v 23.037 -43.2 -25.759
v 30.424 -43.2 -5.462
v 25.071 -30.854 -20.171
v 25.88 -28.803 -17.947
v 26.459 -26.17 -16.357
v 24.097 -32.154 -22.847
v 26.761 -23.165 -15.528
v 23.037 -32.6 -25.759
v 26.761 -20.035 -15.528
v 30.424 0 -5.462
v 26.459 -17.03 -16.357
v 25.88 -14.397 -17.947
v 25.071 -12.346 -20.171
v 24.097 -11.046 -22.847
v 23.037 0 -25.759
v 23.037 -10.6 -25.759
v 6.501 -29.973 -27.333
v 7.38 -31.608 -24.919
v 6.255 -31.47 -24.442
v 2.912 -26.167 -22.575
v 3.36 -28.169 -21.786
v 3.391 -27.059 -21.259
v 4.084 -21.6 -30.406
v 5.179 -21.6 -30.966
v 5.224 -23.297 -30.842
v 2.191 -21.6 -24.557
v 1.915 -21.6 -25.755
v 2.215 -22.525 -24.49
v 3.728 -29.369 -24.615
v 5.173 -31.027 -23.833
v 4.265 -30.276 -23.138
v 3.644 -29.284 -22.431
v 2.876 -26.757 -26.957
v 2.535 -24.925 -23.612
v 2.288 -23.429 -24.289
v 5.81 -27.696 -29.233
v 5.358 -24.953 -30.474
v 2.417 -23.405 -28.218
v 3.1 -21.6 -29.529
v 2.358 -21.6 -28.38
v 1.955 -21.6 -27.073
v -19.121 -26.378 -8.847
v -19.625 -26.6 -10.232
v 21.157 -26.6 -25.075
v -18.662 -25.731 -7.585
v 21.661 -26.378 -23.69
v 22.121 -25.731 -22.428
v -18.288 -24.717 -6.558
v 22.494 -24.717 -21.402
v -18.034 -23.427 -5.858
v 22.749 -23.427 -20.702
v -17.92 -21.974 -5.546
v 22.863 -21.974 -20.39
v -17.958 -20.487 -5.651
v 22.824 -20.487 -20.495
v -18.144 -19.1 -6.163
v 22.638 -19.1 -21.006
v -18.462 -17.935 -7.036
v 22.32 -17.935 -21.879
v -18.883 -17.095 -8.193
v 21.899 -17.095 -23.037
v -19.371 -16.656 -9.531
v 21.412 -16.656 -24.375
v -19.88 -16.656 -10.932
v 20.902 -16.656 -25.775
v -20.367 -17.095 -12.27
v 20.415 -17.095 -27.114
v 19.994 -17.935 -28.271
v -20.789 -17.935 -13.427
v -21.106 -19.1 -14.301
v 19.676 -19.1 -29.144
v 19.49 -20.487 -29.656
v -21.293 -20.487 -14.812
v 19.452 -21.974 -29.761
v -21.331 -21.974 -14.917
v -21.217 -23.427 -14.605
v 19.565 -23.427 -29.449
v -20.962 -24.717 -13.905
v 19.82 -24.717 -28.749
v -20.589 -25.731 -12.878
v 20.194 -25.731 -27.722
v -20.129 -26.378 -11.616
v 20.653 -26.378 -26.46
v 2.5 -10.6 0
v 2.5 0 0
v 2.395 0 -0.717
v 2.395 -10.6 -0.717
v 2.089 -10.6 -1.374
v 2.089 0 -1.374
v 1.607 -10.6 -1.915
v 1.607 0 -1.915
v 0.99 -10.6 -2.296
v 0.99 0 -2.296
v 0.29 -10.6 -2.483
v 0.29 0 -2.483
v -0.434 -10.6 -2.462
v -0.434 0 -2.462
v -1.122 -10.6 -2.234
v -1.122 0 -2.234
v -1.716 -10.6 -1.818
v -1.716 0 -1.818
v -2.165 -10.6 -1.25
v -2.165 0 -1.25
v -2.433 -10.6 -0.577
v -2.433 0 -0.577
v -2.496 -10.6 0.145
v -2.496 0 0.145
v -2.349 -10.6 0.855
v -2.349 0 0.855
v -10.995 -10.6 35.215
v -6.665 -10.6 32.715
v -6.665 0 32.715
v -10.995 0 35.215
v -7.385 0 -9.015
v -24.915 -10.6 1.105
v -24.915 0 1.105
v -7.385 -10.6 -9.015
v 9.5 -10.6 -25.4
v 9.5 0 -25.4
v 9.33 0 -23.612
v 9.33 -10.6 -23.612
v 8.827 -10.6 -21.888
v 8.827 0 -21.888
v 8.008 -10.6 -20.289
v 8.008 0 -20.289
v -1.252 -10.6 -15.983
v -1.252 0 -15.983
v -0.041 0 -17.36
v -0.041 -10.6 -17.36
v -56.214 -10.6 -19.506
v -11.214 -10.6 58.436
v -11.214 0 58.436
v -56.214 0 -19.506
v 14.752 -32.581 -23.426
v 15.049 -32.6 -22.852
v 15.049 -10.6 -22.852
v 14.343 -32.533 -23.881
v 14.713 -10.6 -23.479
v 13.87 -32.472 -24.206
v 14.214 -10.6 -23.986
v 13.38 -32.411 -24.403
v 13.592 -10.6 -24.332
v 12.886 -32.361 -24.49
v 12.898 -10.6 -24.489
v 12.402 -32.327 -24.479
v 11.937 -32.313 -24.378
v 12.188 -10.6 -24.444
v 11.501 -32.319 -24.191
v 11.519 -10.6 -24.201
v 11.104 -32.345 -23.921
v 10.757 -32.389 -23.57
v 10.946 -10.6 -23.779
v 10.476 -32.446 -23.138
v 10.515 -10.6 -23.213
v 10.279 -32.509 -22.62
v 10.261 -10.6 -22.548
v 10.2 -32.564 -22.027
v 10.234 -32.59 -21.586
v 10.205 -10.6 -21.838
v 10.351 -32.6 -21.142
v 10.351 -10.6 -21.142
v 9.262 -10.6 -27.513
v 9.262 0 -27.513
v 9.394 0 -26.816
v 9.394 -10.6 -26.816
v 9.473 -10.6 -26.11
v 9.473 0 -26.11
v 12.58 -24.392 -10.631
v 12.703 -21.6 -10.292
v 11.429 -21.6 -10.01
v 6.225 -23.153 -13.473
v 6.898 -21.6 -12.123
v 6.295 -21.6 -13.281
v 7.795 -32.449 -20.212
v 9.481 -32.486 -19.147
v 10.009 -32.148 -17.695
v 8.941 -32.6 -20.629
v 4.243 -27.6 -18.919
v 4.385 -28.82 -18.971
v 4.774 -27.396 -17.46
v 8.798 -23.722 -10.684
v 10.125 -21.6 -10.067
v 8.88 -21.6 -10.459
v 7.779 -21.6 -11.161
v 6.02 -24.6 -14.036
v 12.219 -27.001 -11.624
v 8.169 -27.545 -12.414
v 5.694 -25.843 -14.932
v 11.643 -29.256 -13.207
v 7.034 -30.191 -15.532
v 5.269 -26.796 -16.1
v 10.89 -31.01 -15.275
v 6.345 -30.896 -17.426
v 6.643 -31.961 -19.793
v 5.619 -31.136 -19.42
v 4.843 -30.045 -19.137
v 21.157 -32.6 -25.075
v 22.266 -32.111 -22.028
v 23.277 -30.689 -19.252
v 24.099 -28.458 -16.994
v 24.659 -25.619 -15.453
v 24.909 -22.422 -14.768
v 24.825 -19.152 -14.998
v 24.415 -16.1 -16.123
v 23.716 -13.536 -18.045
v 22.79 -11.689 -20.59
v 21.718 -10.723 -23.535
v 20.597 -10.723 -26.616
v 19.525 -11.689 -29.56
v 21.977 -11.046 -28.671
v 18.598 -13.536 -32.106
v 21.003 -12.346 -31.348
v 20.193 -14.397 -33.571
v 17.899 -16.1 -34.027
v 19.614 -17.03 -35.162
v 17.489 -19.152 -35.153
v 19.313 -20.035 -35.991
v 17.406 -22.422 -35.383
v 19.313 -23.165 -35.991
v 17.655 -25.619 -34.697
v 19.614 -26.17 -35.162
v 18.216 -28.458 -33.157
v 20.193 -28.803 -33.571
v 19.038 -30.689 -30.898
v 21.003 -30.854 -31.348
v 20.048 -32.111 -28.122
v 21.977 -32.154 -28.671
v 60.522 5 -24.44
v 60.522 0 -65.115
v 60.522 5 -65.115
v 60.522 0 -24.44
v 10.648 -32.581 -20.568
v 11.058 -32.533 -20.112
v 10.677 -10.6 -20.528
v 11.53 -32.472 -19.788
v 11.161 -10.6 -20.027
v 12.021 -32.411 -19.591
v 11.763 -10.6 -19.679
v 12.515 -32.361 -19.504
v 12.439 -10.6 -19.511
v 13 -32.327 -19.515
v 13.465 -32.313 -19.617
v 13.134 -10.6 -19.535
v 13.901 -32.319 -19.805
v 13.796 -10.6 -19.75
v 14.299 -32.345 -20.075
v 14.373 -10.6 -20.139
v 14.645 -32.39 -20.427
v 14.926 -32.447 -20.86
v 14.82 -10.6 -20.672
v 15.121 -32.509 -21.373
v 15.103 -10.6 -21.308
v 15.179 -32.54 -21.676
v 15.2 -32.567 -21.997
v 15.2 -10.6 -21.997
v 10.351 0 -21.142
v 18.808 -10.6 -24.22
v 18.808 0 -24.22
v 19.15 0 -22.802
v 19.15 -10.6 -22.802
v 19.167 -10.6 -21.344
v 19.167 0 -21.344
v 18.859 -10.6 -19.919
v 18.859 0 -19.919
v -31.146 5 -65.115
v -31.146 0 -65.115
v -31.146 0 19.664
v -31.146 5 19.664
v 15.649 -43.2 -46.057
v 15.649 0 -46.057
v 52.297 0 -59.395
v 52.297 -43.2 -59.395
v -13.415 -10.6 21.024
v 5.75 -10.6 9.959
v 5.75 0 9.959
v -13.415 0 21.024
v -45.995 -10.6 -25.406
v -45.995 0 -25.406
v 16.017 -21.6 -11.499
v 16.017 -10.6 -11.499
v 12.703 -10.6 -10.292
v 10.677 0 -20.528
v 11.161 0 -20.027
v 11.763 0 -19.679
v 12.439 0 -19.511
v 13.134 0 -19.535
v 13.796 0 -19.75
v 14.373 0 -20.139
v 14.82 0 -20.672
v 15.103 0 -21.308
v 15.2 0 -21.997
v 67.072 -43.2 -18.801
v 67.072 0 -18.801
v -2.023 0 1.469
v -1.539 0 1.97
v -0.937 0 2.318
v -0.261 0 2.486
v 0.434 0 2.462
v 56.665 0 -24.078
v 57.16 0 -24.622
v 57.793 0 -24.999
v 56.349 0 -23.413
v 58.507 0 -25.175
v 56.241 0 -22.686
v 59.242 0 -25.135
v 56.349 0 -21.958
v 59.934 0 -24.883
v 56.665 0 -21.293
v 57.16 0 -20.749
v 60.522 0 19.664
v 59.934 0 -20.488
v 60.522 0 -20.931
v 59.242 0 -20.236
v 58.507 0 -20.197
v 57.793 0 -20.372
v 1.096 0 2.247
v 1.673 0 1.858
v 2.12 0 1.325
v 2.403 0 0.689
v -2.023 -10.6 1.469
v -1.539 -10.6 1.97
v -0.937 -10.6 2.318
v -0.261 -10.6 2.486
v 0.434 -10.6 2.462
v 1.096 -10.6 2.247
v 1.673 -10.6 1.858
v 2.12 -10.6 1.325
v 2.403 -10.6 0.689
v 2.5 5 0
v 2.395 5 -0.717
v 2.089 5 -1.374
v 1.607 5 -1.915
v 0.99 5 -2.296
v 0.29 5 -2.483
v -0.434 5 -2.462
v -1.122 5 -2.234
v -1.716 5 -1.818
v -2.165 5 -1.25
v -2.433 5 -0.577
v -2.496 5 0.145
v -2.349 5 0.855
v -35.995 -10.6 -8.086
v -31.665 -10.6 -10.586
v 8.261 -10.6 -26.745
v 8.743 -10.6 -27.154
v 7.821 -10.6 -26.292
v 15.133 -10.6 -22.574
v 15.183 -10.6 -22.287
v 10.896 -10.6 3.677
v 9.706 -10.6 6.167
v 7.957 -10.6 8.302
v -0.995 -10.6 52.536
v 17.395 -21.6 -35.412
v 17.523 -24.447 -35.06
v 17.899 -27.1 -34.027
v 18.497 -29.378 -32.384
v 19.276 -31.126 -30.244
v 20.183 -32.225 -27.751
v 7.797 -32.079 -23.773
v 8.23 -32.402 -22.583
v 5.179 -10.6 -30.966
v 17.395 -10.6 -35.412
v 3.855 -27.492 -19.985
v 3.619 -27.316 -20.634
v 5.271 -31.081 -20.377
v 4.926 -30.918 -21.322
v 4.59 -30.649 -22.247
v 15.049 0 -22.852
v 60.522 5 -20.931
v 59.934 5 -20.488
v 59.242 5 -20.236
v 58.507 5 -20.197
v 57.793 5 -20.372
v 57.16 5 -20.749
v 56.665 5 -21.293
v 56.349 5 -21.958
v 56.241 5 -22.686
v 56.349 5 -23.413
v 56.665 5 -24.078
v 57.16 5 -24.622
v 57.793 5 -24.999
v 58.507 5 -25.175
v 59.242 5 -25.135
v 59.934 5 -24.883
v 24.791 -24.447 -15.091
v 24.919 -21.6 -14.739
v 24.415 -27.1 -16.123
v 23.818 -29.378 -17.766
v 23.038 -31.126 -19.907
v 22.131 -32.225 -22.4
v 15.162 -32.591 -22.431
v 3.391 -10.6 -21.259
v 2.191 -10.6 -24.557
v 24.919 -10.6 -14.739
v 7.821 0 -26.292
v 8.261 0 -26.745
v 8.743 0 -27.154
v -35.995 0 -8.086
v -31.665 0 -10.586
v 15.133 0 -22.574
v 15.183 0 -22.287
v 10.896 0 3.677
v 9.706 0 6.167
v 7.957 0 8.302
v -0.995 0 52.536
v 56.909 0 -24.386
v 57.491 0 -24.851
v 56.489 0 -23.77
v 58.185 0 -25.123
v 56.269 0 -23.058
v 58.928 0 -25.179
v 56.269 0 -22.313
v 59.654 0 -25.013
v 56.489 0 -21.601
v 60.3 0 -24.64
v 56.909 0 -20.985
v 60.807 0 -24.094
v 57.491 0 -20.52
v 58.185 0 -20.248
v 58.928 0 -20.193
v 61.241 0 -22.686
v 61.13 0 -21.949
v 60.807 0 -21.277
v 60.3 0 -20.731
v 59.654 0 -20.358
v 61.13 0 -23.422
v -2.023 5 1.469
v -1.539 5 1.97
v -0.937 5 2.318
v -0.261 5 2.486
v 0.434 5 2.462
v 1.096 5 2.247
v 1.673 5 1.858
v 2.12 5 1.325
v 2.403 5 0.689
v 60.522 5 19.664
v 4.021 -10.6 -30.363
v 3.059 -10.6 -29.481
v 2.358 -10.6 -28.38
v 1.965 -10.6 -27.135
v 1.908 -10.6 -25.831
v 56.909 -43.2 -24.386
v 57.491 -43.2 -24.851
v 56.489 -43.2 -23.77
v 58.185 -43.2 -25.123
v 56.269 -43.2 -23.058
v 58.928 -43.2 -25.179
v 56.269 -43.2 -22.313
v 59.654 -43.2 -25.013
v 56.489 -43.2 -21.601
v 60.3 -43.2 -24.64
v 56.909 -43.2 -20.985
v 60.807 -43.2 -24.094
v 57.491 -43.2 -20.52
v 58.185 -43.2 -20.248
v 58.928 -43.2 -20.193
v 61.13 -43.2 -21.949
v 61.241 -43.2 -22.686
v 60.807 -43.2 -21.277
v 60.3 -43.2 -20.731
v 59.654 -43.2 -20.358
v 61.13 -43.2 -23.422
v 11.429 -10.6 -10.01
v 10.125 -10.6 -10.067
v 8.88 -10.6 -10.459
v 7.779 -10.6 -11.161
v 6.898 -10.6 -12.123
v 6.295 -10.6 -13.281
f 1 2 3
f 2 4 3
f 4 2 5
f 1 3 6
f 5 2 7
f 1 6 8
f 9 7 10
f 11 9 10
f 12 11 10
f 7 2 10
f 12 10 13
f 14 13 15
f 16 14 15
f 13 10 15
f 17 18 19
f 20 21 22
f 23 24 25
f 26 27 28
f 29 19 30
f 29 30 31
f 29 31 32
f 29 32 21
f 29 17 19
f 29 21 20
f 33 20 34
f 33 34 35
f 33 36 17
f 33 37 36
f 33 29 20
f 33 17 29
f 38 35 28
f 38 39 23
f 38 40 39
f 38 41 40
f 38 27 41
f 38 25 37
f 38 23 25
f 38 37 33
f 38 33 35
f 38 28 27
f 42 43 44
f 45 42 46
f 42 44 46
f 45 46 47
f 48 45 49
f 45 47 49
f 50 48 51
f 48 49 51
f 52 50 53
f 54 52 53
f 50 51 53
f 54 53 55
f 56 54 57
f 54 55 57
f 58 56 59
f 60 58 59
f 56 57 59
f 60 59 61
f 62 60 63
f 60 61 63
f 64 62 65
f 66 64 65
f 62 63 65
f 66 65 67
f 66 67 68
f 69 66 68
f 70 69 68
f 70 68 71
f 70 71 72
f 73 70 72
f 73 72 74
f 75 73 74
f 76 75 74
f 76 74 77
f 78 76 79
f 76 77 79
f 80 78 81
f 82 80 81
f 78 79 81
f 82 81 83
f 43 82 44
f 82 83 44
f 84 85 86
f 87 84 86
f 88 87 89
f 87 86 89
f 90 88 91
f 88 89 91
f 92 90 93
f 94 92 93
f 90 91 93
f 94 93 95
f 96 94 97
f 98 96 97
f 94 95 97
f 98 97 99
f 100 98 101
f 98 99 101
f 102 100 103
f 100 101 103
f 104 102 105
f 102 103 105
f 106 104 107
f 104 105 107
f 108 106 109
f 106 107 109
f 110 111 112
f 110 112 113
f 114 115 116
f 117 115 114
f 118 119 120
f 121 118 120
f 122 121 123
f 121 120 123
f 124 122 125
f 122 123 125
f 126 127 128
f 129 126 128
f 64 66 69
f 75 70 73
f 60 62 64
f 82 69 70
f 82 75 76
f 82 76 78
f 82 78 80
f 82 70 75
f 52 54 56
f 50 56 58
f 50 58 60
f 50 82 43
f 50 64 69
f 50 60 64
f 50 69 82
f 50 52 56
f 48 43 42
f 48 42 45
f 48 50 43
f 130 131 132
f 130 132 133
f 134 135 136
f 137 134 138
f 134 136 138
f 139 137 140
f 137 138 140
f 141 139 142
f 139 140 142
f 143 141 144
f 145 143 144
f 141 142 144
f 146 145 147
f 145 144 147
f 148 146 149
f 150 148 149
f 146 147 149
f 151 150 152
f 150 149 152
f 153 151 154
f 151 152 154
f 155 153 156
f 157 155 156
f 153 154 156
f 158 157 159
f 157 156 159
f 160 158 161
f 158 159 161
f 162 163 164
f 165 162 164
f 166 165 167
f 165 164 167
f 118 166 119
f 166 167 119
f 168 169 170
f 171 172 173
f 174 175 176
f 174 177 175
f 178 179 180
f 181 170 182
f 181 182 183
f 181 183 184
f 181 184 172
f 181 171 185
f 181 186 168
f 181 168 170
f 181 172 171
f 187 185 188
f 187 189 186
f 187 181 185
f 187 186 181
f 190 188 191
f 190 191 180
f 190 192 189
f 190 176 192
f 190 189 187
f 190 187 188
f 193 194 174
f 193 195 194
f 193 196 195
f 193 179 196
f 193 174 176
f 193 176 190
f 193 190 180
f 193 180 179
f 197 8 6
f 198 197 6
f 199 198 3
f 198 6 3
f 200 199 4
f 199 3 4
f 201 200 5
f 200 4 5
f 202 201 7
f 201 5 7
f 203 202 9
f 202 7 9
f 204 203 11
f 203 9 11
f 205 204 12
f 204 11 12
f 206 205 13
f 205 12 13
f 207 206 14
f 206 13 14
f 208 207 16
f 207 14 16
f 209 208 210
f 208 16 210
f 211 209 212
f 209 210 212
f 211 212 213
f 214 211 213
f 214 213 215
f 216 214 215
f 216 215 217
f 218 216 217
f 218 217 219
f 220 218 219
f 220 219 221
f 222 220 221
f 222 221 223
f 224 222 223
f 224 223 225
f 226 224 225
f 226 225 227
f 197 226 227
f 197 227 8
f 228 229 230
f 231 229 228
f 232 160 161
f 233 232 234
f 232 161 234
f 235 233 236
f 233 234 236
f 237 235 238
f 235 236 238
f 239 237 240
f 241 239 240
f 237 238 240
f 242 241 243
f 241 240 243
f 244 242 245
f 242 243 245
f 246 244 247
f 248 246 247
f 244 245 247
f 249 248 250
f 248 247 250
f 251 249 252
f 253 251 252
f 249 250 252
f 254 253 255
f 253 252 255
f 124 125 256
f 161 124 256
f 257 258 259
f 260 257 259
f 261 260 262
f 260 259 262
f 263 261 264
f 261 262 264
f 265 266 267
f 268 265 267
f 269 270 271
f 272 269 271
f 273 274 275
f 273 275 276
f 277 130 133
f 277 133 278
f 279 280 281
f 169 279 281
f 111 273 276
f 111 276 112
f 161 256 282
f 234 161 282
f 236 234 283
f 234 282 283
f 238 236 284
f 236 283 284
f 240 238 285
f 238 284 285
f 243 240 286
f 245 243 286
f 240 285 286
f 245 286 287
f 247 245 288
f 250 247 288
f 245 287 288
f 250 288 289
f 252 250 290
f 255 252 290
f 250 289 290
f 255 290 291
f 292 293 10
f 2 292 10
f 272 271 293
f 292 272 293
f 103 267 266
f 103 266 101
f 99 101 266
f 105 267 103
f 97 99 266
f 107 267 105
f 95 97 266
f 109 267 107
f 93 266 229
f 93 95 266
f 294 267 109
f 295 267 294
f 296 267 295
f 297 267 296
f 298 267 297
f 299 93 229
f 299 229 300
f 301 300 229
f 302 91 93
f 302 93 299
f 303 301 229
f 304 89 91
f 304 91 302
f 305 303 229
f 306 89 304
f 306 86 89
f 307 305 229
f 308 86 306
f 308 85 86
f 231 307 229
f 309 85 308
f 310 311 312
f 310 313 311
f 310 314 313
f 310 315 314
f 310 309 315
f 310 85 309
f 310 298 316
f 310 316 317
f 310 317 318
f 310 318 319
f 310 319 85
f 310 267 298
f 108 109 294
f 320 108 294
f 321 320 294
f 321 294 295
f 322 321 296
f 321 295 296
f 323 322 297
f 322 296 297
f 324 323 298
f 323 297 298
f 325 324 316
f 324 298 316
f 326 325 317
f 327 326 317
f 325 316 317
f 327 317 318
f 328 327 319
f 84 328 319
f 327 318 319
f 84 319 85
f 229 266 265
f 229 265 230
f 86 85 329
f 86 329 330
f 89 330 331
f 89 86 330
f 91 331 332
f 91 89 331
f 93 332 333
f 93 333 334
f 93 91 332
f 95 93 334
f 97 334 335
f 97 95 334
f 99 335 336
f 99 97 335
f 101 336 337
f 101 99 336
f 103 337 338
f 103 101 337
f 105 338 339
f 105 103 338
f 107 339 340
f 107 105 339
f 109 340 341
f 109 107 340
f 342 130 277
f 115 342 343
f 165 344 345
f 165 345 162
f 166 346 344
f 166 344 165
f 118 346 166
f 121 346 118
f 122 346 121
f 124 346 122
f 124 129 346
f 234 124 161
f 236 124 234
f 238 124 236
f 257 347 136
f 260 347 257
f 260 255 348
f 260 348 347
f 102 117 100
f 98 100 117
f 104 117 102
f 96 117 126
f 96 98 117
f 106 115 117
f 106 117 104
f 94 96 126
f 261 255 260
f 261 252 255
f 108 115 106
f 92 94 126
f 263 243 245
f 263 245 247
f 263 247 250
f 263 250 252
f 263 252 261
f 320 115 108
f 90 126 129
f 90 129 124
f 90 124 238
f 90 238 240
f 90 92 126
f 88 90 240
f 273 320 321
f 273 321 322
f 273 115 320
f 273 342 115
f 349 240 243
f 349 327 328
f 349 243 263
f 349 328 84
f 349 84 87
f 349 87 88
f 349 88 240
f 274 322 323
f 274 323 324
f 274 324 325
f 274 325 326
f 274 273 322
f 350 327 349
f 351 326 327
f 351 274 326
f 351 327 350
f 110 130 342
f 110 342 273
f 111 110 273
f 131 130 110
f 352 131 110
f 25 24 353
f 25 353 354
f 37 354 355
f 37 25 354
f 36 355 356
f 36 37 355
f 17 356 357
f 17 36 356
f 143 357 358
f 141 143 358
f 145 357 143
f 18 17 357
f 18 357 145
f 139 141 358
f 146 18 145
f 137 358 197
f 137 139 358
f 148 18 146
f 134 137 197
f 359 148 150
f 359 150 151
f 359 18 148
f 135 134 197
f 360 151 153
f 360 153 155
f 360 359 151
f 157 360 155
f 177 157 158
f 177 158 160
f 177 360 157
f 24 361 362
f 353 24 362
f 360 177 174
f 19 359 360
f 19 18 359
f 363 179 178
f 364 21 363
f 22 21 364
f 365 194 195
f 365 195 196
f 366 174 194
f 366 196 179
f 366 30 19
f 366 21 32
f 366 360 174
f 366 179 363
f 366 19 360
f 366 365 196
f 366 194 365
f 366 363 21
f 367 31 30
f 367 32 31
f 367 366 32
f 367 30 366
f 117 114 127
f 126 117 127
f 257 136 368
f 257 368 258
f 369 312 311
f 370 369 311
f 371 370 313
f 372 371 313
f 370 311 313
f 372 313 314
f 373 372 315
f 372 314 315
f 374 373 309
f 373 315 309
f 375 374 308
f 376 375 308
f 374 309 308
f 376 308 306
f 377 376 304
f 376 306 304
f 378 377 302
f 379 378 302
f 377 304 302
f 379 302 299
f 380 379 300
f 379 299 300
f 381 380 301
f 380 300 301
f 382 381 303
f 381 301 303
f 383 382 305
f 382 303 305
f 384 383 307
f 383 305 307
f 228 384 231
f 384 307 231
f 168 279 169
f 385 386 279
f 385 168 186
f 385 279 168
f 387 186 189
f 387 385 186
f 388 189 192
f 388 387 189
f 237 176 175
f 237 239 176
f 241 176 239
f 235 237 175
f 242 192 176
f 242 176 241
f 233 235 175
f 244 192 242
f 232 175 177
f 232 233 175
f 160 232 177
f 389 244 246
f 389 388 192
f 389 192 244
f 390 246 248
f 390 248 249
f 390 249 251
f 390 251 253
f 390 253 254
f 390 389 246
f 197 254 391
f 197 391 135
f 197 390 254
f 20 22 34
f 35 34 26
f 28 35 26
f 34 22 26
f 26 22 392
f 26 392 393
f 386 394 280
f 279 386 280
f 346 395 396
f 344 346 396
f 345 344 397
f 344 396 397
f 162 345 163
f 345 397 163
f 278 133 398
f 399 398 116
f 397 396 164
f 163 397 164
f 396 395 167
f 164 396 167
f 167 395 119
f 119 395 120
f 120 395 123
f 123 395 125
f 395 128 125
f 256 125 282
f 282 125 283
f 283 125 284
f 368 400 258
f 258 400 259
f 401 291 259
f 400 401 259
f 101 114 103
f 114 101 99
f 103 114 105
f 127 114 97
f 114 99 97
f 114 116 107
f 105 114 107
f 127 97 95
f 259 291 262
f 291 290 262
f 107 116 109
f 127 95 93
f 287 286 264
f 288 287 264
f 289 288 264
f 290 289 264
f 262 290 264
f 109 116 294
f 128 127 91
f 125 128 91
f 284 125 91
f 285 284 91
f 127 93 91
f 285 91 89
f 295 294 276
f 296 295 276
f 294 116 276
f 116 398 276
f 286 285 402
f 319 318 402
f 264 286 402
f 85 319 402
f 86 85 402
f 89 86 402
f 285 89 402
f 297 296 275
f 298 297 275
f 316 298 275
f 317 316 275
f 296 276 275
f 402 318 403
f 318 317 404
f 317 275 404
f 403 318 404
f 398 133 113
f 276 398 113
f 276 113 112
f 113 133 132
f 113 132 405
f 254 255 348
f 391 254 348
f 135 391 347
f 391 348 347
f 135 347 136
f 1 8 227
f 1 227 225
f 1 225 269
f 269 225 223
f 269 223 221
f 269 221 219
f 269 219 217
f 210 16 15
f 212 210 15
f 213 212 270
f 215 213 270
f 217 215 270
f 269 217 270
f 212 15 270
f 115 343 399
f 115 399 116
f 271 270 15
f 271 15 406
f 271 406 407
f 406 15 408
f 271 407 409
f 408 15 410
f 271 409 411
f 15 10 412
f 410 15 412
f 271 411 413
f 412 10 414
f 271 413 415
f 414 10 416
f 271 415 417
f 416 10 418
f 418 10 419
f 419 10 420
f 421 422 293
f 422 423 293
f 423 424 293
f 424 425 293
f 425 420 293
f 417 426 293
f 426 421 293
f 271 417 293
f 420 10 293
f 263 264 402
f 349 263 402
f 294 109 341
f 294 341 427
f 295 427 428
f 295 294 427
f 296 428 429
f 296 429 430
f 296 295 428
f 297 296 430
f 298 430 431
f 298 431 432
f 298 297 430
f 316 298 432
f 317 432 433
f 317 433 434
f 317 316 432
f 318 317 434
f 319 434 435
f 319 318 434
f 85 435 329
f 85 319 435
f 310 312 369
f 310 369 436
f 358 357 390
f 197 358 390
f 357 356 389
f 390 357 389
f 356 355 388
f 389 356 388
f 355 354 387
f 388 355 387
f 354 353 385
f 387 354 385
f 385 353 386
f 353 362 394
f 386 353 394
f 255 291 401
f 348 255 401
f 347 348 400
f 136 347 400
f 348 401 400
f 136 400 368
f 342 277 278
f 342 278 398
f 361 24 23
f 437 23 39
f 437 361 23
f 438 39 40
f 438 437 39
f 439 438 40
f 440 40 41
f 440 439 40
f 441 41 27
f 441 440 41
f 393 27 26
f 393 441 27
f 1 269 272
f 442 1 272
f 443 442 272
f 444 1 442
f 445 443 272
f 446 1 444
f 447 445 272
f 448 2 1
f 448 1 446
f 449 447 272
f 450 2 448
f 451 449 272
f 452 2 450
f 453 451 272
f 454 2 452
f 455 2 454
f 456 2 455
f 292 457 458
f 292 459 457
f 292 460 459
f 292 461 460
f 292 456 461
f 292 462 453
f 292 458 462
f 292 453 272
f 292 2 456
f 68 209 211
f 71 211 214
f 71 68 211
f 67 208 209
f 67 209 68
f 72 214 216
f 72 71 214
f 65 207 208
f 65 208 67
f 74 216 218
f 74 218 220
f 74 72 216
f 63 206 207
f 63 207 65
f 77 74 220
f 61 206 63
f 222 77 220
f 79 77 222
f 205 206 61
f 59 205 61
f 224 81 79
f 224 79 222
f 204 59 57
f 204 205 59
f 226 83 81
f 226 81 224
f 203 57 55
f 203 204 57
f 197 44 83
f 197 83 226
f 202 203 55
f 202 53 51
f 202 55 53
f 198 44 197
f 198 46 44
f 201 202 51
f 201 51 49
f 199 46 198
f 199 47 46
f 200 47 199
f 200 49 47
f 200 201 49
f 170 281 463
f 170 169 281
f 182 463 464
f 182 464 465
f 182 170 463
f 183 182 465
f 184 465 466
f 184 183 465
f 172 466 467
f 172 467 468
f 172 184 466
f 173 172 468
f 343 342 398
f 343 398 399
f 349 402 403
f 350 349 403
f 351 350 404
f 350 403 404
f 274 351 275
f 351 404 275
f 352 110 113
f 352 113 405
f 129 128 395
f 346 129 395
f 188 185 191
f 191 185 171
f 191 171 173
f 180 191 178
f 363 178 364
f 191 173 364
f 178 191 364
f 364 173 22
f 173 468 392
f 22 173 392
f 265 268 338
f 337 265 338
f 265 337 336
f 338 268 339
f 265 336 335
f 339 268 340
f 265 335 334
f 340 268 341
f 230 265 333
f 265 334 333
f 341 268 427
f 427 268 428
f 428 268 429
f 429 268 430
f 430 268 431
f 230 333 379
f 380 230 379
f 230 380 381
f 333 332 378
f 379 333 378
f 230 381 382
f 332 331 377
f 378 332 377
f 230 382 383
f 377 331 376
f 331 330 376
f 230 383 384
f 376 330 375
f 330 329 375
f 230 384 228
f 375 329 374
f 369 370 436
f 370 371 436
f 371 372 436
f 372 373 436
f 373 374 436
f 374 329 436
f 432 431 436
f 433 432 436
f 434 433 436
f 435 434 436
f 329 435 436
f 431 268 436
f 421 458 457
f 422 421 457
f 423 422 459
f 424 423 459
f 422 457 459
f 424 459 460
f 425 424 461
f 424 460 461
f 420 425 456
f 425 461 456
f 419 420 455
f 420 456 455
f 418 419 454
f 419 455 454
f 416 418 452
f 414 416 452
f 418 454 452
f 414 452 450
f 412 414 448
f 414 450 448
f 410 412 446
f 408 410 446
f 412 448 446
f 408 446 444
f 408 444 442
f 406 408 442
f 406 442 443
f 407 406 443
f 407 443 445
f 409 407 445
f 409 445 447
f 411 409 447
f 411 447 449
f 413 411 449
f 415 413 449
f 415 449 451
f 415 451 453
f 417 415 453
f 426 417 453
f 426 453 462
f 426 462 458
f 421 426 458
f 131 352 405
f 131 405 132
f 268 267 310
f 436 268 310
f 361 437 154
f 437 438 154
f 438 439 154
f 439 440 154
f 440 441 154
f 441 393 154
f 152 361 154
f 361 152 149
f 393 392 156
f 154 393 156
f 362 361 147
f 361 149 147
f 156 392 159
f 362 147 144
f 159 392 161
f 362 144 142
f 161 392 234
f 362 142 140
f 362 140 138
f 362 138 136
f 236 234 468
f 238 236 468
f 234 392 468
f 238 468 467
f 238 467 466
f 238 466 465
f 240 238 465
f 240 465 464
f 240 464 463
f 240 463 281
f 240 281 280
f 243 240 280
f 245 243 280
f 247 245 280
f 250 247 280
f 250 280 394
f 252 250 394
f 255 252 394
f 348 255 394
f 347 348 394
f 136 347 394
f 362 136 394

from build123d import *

# Parameters (mm, degrees)
F1_DEPTH    = 10.6
F2_DEPTH    = 43.2
F3_R        = 11
F4_DEPTH    = 2
F5_R        = 5
F6_DEPTH    = 43.4
F8_DEPTH    = 22
F9_T1_DEPTH = 73
F9_T3_DEPTH = 73
F10_W       = 91.6676837951
F10_H       = 84.7782492638
F11_DEPTH   = 5
F12_R       = 2.5
F13_DEPTH   = 74.8
F15_DEPTH   = 10.6
F16_R       = 5


# Not quite as in the source:
# - a fillet or chamfer that OpenCascade refuses, or shapes differently, is made with other operations: its cross-section is extruded or revolved along the edge and cut away or added
# - a feature names something its author has since deleted; it is built from what else it names


with BuildPart() as f1:
    # F0 (on Front) → F1 (new body)
    with BuildSketch(Plane.XZ):
        with BuildLine():
            Line((18.8587860588, -19.9187396285), (10.8963137964, 3.6770022643))
            ThreePointArc((10.8963137964, 3.6770022643), (0.1357629169, 11.4991985995), (-10.806465139, 3.9332316482))
            ThreePointArc((-10.806465139, 3.9332316482), (-11.3009249511, -2.1305152546), (-8.6325342688, -7.5979834231))
            Line((-8.6325342688, -7.5979834231), (-1.2524718249, -15.9829243219))
            ThreePointArc((-1.2524718249, -15.9829243219), (4.0057955945, -16.7858487559), (8.0082155178, -20.289375359))
            Line((8.0082155178, -20.289375359), (10.350768448, -21.1419948978))
            ThreePointArc((10.350768448, -21.1419948978), (13.1341204442, -19.5350258736), (15.2, -21.9970452561))
            ThreePointArc((15.2, -21.9970452561), (15.1620193825, -22.4311657003), (15.049231552, -22.8520956144))
            Line((15.049231552, -22.8520956144), (18.8080020351, -24.2201761877))
            ThreePointArc((18.8080020351, -24.2201761877), (19.1995470345, -22.0737808179), (18.8587860588, -19.9187396285))
        make_face()
        with BuildLine():
            ThreePointArc((2.5, 0), (-0.4341204442, -2.4620193825), (-2.349231552, 0.8550503583))
            ThreePointArc((-2.349231552, 0.8550503583), (0.4341204442, 2.4620193825), (2.5, 0))
        make_face(mode=Mode.SUBTRACT)
        with BuildLine():
            ThreePointArc((8.0082155178, -20.289375359), (4.0057955945, -16.7858487559), (-1.2524718249, -15.9829243219))
            Line((-1.2524718249, -15.9829243219), (-0.0405482356, -17.3598649301))
            Line((-0.0405482356, -17.3598649301), (8.0082155178, -20.289375359))
        make_face()
        with BuildLine():
            ThreePointArc((7.8207415002, -26.2915576257), (8.4967135133, -26.9551076509), (9.2619480899, -27.5133664092))
            ThreePointArc((9.2619480899, -27.5133664092), (9.4402994352, -26.4633656816), (9.5, -25.4))
            ThreePointArc((9.5, -25.4), (9.1194311067, -22.738050284), (8.0082155178, -20.289375359))
            Line((8.0082155178, -20.289375359), (-0.0405482356, -17.3598649301))
            Line((-0.0405482356, -17.3598649301), (7.8207415002, -26.2915576257))
        make_face()
    extrude(amount=F1_DEPTH)

    # F14 (on face) → F15 (join)
    with BuildSketch(Plane.XZ.offset(10.6)):
        with BuildLine():
            Line((-31.664557856, -10.5859724576), (-24.914557856, 1.1053704935))
            Line((-24.914557856, 1.1053704935), (-7.3851056739, -9.0152634426))
            Line((-7.3851056739, -9.0152634426), (-8.6325342688, -7.5979834231))
            ThreePointArc((-8.6325342688, -7.5979834231), (-11.4436081592, -1.137467493), (-9.9592921435, 5.75))
            Line((-9.9592921435, 5.75), (-23.4946848749, 13.564662637))
            Line((-23.4946848749, 13.564662637), (-35.9946848749, -8.0859724576))
            Line((-35.9946848749, -8.0859724576), (-31.664557856, -10.5859724576))
        make_face()
        with BuildLine():
            Line((-17.7446848749, 23.5239547806), (-23.4946848749, 13.564662637))
            Line((-23.4946848749, 13.564662637), (-9.9592921435, 5.75))
            ThreePointArc((-9.9592921435, 5.75), (-2.9764190187, 11.1081470023), (5.75, 9.9592921435))
            Line((5.75, 9.9592921435), (-13.414557856, 21.0239547806))
            Line((-13.414557856, 21.0239547806), (-6.664557856, 32.7152977317))
            Line((-6.664557856, 32.7152977317), (-10.9946848749, 35.2152977317))
            Line((-10.9946848749, 35.2152977317), (-17.7446848749, 23.5239547806))
        make_face()
        Polygon((-41.6238499995, -4.8359724576), (-35.9946848749, -8.0859724576), (-23.4946848749, 13.564662637), (-17.7446848749, 23.5239547806), (-10.9946848749, 35.2152977317), (-16.6238499995, 38.4652977317), align=None)
        Polygon((-45.9946848749, -25.4064805333), (-35.9946848749, -8.0859724576), (-41.6238499995, -4.8359724576), (-16.6238499995, 38.4652977317), (-10.9946848749, 35.2152977317), (-0.9946848749, 52.5358058073), (-11.2137846395, 58.4358058073), (-56.2137846395, -19.5064805333), align=None)
    extrude(amount=-F15_DEPTH)


with BuildPart() as f2:
    # F0 (on Front) → F2 (new body)
    with BuildSketch(Plane.XZ):
        Polygon((30.4242539245, -5.4619062237), (23.0366188286, -25.7592668327), (15.6489837328, -46.0566274417), (52.2969959435, -59.3954130314), (67.0722661351, -18.8006918134), align=None)
    extrude(amount=F2_DEPTH)

    # F3 (on face) → F4 (join)
    with BuildSketch(Plane(origin=(28.6207151126, 0, -10.4170883844), x_dir=(0, -1, 0), z_dir=(-0.9396926208, 0, 0.3420201433))):
        with Locations((21.6, -16.326805286)):
            Circle(F3_R)
    extrude(amount=F4_DEPTH)

    # F5 (on face) → F6 (join)
    with BuildSketch(Plane(origin=(26.7413298711, 0, -9.7330480978), x_dir=(0, -1, 0), z_dir=(-0.9396926208, 0, 0.3420201433))):
        with Locations((21.6, -16.326805286)):
            Circle(F5_R)
    extrude(amount=F6_DEPTH)


with BuildPart() as f8:
    # F7 (on face) → F8 (new body)
    with BuildSketch(Plane.XZ.offset(10.6)):
        with BuildLine():
            ThreePointArc((15.049231552, -22.8520956144), (11.8449496417, -24.3462768081), (10.350768448, -21.1419948978))
            Line((10.350768448, -21.1419948978), (8.0082155178, -20.289375359))
            ThreePointArc((8.0082155178, -20.289375359), (9.3600827685, -23.7755460709), (9.2619480899, -27.5133664092))
            ThreePointArc((9.2619480899, -27.5133664092), (8.4967135133, -26.9551076509), (7.8207415002, -26.2915576257))
            Line((7.8207415002, -26.2915576257), (3.3911070963, -21.2587787078))
            Line((3.3911070963, -21.2587787078), (0.4805448363, -29.2554827948))
            Line((0.4805448363, -29.2554827948), (17.3950120105, -35.4118453747))
            Line((17.3950120105, -35.4118453747), (24.9194551637, -14.7386077174))
            Line((24.9194551637, -14.7386077174), (16.0173460598, -11.4985049814))
            Line((16.0173460598, -11.4985049814), (18.8587860588, -19.9187396285))
            ThreePointArc((18.8587860588, -19.9187396285), (19.1995470345, -22.0737808179), (18.8080020351, -24.2201761877))
            Line((18.8080020351, -24.2201761877), (15.049231552, -22.8520956144))
        make_face()
        with BuildLine():
            ThreePointArc((10.350768448, -21.1419948978), (13.1341204442, -19.5350258736), (15.2, -21.9970452561))
            ThreePointArc((15.2, -21.9970452561), (15.1620193825, -22.4311657003), (15.049231552, -22.8520956144))
            Line((15.049231552, -22.8520956144), (18.8080020351, -24.2201761877))
            ThreePointArc((18.8080020351, -24.2201761877), (19.1995470345, -22.0737808179), (18.8587860588, -19.9187396285))
            Line((18.8587860588, -19.9187396285), (16.0173460598, -11.4985049814))
            Line((16.0173460598, -11.4985049814), (8.0049879895, -8.5822451375))
            Line((8.0049879895, -8.5822451375), (3.3911070963, -21.2587787078))
            Line((3.3911070963, -21.2587787078), (7.8207415002, -26.2915576257))
            ThreePointArc((7.8207415002, -26.2915576257), (8.4967135133, -26.9551076509), (9.2619480899, -27.5133664092))
            ThreePointArc((9.2619480899, -27.5133664092), (9.3600827685, -23.7755460709), (8.0082155178, -20.289375359))
            Line((8.0082155178, -20.289375359), (10.350768448, -21.1419948978))
        make_face()
    extrude(amount=F8_DEPTH)

    # F9: fillet of radius 11 on 2 edges, made by hand

    # F9_s2 → F9_t1 (cut)
    with BuildSketch(Plane(origin=(52.5828769427, 0, -19.1386020392), x_dir=(0, 1, 0), z_dir=(-0.9396926208, 0, 0.3420201433))):
        with BuildLine():
            ThreePointArc((-21.6, 5.326805286), (-29.3781745931, 8.548630693), (-32.6, 16.326805286))
            Line((-32.6, 16.326805286), (-32.6, 5.326805286))
            Line((-32.6, 5.326805286), (-21.6, 5.326805286))
        make_face()
    extrude(amount=F9_T1_DEPTH, mode=Mode.SUBTRACT)

    # F9_s4 → F9_t3 (cut)
    with BuildSketch(Plane(origin=(-16.0146843747, 0, 5.8288684236), x_dir=(0, 1, 0), z_dir=(0.9396926208, 0, -0.3420201433))):
        with BuildLine():
            ThreePointArc((-21.6, -27.326805286), (-29.3781745931, -24.1049798791), (-32.6, -16.326805286))
            Line((-32.6, -16.326805286), (-32.6, -27.326805286))
            Line((-32.6, -27.326805286), (-21.6, -27.326805286))
        make_face()
    extrude(amount=F9_T3_DEPTH, mode=Mode.SUBTRACT)

    # F16
    f16_edges = [f8.edges().sort_by_distance(p)[0] for p in [
        (6.903059, -29.378175, -11.609771),
        (0.480545, -16.1, -29.255483),
        (1.582474, -29.378175, -26.227957),
        (8.004988, -16.1, -8.582245),
    ]]
    fillet(f16_edges, radius=F16_R)


with BuildPart() as f11:
    # F10 (on face) → F11 (new body)
    with BuildSketch(Plane.XZ):
        with Locations((14.6878799424, -22.7255448699)):
            Rectangle(F10_W, F10_H)
        with BuildLine():
            Line((10.8963137964, 3.6770022643), (18.8587860588, -19.9187396285))
            ThreePointArc((18.8587860588, -19.9187396285), (19.1995470345, -22.0737808179), (18.8080020351, -24.2201761877))
            Line((18.8080020351, -24.2201761877), (15.049231552, -22.8520956144))
            ThreePointArc((15.049231552, -22.8520956144), (15.1620193825, -22.4311657003), (15.2, -21.9970452561))
            ThreePointArc((15.2, -21.9970452561), (13.1341204442, -19.5350258736), (10.350768448, -21.1419948978))
            Line((10.350768448, -21.1419948978), (8.0082155178, -20.289375359))
            ThreePointArc((8.0082155178, -20.289375359), (4.0057955945, -16.7858487559), (-1.2524718249, -15.9829243219))
            Line((-1.2524718249, -15.9829243219), (-8.6325342688, -7.5979834231))
            ThreePointArc((-8.6325342688, -7.5979834231), (-11.3009249511, -2.1305152546), (-10.806465139, 3.9332316482))
            ThreePointArc((-10.806465139, 3.9332316482), (0.1357629169, 11.4991985995), (10.8963137964, 3.6770022643))
        make_face(mode=Mode.SUBTRACT)
    extrude(amount=-F11_DEPTH)

    # F0 (on Front) → F11, piece 2 (join)
    with BuildSketch(Plane.XZ):
        with BuildLine():
            Line((18.8587860588, -19.9187396285), (10.8963137964, 3.6770022643))
            ThreePointArc((10.8963137964, 3.6770022643), (0.1357629169, 11.4991985995), (-10.806465139, 3.9332316482))
            ThreePointArc((-10.806465139, 3.9332316482), (-11.3009249511, -2.1305152546), (-8.6325342688, -7.5979834231))
            Line((-8.6325342688, -7.5979834231), (-1.2524718249, -15.9829243219))
            ThreePointArc((-1.2524718249, -15.9829243219), (4.0057955945, -16.7858487559), (8.0082155178, -20.289375359))
            Line((8.0082155178, -20.289375359), (10.350768448, -21.1419948978))
            ThreePointArc((10.350768448, -21.1419948978), (13.1341204442, -19.5350258736), (15.2, -21.9970452561))
            ThreePointArc((15.2, -21.9970452561), (15.1620193825, -22.4311657003), (15.049231552, -22.8520956144))
            Line((15.049231552, -22.8520956144), (18.8080020351, -24.2201761877))
            ThreePointArc((18.8080020351, -24.2201761877), (19.1995470345, -22.0737808179), (18.8587860588, -19.9187396285))
        make_face()
        with BuildLine():
            ThreePointArc((2.5, 0), (-0.4341204442, -2.4620193825), (-2.349231552, 0.8550503583))
            ThreePointArc((-2.349231552, 0.8550503583), (0.4341204442, 2.4620193825), (2.5, 0))
        make_face(mode=Mode.SUBTRACT)
        with BuildLine():
            ThreePointArc((10.350768448, -21.1419948978), (11.8449496417, -24.3462768081), (15.049231552, -22.8520956144))
            Line((15.049231552, -22.8520956144), (10.350768448, -21.1419948978))
        make_face()
        with BuildLine():
            Line((10.350768448, -21.1419948978), (15.049231552, -22.8520956144))
            ThreePointArc((15.049231552, -22.8520956144), (15.1620193825, -22.4311657003), (15.2, -21.9970452561))
            ThreePointArc((15.2, -21.9970452561), (13.1341204442, -19.5350258736), (10.350768448, -21.1419948978))
        make_face()
    extrude(amount=-F11_DEPTH)


with BuildPart() as f13_tool:
    # F12 (on face) → F13 (new body)
    with BuildSketch(Plane.XZ.offset(43.2)):
        with Locations((58.7411331684, -22.6855629169)):
            Circle(F12_R)
    extrude(amount=-F13_DEPTH)


with BuildPart() as f2_1:
    add(f2.part)

    # F13: cut by f13_tool
    add(f13_tool.part, mode=Mode.SUBTRACT)


with BuildPart() as f11_1:
    add(f11.part)

    # F13: cut by f13_tool
    add(f13_tool.part, mode=Mode.SUBTRACT)


solid = Compound([f1.part, f8.part, f2_1.part, f11_1.part])
